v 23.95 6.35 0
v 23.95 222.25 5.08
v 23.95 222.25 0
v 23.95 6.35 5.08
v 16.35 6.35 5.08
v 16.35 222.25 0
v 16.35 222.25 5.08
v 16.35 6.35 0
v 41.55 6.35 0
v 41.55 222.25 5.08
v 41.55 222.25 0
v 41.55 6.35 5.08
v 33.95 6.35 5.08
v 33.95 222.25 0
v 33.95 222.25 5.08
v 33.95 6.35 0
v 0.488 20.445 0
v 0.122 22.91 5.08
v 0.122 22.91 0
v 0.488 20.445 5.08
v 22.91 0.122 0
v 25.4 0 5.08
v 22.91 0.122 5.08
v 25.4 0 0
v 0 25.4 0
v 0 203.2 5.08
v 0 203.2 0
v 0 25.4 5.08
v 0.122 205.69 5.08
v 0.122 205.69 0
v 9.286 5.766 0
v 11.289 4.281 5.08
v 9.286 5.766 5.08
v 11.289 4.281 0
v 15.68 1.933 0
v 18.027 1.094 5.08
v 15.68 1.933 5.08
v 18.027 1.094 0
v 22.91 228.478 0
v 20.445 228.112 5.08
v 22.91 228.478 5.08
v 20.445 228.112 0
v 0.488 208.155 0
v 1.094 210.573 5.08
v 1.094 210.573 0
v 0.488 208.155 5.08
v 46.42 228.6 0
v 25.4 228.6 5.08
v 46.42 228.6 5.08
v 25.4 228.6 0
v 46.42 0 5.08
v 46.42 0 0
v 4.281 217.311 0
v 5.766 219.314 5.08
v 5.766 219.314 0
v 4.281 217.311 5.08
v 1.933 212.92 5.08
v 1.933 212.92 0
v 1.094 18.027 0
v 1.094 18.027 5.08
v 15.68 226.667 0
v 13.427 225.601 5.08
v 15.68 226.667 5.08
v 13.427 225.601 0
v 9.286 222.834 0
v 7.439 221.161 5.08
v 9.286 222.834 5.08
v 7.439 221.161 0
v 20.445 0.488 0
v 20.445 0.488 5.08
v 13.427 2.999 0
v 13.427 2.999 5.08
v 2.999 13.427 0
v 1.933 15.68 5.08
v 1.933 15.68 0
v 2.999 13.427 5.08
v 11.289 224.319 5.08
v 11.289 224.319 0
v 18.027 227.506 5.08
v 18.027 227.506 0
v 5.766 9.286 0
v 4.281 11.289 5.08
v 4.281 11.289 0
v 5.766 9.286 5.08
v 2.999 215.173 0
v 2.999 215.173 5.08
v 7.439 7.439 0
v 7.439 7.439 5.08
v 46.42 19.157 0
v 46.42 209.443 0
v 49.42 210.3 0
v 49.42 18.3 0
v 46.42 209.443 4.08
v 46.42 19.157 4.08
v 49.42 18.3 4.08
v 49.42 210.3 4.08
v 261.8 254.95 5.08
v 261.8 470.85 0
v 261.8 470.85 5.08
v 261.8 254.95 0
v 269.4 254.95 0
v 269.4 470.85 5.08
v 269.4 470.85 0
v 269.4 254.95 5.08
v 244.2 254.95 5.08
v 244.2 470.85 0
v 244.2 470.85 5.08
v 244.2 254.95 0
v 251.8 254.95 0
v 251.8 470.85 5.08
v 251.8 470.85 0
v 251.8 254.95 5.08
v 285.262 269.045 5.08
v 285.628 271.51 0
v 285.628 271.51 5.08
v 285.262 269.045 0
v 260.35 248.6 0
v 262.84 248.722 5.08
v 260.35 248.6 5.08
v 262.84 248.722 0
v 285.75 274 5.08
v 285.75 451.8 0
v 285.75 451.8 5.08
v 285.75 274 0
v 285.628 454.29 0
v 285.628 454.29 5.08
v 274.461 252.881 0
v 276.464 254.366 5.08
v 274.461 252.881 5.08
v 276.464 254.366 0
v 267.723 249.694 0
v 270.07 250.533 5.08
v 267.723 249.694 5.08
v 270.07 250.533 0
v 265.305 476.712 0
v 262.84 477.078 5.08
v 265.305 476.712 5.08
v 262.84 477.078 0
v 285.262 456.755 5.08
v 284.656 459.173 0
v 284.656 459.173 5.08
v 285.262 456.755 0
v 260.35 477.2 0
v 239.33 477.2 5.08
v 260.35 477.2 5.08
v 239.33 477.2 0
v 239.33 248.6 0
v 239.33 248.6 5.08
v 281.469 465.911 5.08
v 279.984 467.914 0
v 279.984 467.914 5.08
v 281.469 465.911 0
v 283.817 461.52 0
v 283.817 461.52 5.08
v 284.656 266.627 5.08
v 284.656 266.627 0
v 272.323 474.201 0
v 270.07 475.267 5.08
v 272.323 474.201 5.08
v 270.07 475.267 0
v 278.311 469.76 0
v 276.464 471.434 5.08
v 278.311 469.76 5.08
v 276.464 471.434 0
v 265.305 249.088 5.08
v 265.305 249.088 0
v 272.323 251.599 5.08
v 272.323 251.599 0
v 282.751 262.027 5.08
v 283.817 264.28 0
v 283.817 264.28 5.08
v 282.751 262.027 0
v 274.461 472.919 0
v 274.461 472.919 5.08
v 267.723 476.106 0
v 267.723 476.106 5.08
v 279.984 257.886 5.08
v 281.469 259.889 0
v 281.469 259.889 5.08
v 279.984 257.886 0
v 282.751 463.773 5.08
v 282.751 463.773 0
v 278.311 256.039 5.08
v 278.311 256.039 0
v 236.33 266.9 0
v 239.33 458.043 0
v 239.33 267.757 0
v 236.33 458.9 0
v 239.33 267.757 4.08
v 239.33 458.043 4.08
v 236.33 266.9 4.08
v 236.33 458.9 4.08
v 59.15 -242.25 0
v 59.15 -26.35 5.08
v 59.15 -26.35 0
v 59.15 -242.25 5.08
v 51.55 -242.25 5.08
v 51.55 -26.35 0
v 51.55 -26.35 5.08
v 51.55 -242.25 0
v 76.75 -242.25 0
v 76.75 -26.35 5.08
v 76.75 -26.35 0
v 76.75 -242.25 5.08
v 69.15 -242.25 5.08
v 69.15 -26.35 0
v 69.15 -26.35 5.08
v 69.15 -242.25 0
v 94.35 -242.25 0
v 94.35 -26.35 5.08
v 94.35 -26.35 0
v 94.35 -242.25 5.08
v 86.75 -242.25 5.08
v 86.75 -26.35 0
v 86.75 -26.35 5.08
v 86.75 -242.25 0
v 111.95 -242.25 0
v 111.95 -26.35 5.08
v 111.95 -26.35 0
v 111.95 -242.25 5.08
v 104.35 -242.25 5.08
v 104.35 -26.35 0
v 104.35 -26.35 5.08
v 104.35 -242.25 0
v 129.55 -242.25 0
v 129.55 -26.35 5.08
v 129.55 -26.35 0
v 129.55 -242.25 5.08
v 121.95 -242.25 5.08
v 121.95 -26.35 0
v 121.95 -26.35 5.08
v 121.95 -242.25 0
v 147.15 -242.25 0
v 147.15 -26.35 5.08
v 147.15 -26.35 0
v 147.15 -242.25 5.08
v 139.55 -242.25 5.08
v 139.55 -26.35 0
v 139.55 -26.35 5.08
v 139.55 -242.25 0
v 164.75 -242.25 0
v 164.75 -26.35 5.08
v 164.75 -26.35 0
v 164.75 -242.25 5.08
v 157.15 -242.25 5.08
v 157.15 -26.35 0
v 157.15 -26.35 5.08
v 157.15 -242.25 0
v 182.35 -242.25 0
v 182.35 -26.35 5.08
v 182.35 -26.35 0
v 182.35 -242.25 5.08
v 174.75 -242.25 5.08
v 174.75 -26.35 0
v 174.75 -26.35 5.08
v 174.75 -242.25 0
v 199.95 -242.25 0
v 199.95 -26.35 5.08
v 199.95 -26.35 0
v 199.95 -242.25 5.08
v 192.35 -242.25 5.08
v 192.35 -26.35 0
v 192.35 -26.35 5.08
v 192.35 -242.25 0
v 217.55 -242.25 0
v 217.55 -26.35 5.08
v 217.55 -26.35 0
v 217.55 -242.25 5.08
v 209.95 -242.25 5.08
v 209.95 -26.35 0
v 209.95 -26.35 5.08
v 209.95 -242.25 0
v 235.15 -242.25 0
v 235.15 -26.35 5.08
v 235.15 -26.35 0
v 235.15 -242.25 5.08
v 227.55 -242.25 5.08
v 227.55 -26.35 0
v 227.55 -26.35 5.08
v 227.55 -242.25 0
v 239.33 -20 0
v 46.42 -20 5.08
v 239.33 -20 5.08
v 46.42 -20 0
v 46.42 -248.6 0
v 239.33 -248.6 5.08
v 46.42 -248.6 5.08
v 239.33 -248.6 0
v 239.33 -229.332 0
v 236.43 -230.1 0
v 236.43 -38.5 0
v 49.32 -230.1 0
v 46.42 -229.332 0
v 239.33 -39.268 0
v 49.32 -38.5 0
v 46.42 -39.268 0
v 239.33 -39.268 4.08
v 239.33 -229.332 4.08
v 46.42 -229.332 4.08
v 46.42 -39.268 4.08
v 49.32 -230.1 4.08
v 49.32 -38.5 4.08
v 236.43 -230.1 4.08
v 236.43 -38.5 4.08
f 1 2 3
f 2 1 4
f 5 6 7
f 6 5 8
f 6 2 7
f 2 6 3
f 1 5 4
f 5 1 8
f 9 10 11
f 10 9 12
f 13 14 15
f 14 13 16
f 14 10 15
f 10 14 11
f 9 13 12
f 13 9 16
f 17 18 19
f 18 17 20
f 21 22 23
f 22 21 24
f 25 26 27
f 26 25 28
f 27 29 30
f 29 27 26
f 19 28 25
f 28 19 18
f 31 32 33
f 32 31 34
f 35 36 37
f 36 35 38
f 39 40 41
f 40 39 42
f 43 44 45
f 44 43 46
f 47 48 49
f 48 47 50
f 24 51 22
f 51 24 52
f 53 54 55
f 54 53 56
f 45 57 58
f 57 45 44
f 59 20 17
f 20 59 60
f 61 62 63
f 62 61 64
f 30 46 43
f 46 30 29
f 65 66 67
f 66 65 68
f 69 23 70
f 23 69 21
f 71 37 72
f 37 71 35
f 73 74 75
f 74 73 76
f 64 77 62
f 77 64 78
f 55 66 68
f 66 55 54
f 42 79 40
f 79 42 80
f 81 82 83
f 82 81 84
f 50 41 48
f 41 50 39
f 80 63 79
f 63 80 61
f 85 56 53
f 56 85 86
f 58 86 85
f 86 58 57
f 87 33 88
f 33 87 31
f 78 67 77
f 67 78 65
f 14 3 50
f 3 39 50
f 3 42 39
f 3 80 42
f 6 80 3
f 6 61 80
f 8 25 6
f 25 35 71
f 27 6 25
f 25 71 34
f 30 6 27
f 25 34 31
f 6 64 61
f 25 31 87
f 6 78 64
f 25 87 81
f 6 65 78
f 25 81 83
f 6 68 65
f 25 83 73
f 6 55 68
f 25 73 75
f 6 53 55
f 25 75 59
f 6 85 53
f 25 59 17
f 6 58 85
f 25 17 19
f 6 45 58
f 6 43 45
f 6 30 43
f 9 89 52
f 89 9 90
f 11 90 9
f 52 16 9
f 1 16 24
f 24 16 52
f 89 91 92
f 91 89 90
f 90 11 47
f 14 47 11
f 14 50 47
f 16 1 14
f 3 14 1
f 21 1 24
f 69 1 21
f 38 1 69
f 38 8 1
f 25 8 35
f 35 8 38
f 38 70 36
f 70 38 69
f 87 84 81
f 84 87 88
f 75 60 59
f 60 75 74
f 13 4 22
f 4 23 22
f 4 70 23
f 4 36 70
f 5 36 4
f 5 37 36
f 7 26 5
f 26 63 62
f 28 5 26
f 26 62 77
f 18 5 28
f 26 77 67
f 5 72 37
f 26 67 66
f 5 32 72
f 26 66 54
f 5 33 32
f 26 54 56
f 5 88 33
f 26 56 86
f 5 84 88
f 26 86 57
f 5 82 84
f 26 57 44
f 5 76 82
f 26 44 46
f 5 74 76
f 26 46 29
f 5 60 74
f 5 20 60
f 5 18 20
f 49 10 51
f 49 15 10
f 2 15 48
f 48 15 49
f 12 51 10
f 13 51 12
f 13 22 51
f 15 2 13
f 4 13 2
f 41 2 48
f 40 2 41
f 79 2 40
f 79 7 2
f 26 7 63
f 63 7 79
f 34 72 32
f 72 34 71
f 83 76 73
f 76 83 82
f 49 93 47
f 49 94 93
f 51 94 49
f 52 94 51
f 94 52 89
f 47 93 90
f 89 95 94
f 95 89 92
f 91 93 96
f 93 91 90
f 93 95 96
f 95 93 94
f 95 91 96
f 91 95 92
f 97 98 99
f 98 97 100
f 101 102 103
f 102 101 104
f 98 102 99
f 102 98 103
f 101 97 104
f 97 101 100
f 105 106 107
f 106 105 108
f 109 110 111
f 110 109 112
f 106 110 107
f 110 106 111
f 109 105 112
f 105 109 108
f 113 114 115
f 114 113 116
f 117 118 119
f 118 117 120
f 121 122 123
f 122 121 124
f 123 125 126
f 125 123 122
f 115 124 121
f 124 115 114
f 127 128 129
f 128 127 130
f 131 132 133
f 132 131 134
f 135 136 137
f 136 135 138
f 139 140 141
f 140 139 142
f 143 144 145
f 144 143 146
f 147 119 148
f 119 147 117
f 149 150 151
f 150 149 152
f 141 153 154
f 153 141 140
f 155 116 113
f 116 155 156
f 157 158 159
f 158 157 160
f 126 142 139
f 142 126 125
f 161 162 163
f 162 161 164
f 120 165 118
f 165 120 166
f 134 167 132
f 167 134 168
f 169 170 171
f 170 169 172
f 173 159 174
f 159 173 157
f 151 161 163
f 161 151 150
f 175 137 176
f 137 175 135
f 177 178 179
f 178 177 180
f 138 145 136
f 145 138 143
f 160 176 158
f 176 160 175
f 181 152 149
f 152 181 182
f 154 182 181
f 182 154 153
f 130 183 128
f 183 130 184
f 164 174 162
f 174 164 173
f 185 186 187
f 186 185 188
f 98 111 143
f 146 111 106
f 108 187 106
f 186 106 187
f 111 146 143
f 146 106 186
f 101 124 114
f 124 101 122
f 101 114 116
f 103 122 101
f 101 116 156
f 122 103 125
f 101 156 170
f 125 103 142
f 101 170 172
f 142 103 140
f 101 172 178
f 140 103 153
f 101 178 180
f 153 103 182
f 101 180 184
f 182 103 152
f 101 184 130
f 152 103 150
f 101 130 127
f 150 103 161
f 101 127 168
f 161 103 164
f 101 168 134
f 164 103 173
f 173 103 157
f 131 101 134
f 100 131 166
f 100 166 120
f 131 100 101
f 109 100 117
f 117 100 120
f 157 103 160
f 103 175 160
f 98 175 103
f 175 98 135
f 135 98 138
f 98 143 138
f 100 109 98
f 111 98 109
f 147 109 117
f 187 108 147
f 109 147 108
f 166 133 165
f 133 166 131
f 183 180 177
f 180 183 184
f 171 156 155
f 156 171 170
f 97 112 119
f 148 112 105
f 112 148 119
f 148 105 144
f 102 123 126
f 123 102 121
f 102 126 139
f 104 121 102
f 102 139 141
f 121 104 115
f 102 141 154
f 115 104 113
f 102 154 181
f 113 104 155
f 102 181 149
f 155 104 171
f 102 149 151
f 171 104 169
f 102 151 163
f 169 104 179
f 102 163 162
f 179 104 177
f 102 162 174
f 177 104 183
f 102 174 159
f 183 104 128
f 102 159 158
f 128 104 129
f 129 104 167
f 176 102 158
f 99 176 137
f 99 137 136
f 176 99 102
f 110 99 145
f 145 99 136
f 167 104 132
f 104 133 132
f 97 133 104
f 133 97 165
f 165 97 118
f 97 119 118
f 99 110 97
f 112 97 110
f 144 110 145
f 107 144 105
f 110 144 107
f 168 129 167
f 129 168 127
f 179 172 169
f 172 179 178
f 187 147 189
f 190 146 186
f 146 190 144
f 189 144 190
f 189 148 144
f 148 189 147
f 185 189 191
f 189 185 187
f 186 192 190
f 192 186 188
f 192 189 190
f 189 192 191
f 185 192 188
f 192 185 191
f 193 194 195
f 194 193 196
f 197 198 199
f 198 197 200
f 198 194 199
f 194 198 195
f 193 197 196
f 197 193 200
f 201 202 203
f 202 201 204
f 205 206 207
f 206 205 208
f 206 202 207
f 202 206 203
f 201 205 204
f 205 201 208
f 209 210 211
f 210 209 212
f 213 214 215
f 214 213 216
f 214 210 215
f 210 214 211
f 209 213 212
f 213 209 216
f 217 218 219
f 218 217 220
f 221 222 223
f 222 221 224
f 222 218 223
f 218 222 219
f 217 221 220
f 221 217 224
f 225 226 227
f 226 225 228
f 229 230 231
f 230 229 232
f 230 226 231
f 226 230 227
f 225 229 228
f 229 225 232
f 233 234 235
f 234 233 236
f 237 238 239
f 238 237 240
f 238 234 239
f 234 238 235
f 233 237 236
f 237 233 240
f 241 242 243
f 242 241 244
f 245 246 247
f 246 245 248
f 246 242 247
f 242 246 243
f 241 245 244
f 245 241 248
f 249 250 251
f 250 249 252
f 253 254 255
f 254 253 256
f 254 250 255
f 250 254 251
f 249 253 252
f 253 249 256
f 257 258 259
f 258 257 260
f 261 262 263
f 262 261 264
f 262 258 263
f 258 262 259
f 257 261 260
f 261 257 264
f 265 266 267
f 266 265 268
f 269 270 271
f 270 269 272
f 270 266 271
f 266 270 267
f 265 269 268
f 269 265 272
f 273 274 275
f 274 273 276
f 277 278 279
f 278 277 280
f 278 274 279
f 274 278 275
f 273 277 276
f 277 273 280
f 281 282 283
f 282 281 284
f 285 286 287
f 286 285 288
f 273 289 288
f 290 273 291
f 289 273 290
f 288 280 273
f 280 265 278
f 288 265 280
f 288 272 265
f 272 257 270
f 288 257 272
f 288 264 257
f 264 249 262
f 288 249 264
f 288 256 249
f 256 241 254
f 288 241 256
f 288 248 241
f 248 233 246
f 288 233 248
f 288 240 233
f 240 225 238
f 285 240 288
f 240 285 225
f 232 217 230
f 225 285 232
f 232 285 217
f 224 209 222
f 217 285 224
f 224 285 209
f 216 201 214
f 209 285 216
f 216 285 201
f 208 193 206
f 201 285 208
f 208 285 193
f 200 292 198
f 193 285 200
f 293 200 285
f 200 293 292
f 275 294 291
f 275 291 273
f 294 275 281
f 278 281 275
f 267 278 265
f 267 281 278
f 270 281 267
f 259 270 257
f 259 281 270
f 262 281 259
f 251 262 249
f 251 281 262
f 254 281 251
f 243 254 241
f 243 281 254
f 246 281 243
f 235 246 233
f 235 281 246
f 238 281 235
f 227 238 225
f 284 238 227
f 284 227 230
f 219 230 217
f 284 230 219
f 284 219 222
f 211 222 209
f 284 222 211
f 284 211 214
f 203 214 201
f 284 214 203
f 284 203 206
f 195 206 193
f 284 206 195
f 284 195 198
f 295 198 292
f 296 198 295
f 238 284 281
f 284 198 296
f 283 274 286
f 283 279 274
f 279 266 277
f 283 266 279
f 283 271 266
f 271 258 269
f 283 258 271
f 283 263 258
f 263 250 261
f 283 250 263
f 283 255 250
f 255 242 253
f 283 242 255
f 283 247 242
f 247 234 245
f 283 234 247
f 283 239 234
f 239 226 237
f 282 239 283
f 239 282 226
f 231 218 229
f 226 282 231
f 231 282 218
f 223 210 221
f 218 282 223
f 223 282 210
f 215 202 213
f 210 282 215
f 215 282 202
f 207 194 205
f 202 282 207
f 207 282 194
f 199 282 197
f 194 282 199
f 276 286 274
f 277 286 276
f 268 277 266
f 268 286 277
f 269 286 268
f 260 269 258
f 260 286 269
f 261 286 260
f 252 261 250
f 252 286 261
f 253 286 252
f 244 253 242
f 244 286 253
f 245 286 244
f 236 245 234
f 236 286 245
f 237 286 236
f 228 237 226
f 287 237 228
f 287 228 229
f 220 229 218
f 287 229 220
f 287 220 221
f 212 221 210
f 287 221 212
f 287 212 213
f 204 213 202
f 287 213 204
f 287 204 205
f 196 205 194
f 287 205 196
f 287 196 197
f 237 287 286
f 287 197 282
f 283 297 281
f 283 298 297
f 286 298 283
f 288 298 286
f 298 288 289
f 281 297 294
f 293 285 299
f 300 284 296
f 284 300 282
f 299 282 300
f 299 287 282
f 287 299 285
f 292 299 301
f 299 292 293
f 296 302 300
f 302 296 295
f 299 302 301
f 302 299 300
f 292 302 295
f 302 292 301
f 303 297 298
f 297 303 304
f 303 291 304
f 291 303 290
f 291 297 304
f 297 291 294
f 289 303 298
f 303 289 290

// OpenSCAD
// file: model-forge/model-forge/tray.scad
// model-forge/tray.scad — rounded-corner outer panel with a recessed
// inset pocket (e.g. a "cooking dish" recess): a raised rim around the
// edge, floor thickness under the pocket, and an optional thin lip
// flange around the base — sized to slide into a support-rail groove
// (like the wooden rails inside the real Tiny Land oven cavity) rather
// than just resting loose.
//
//   use <model-forge/tray.scad>
//   rounded_tray(outer_width=285.75, outer_height=228.6, corner_radius=25.4,
//                floor_thickness=5.08, rim_height=3.81, inset_margin=6.35,
//                lip_width=3, lip_thickness=2);
//
// Shape: outer_width x outer_height slab, rounded corners (corner_radius),
// total height = floor_thickness + rim_height. A pocket is cut from the
// top, inset_margin in from every edge, cutting down through rim_height
// and stopping at floor_thickness from the bottom — so floor_thickness is
// what's left under the pocket, rim_height is how tall the surrounding
// wall stands above the pocket floor.
//
// The lip (lip_width/lip_thickness) is a thin flange at the TOP of the
// rim (from total_height-lip_thickness to total_height), sticking out
// lip_width beyond the main body on every side — corrected 2026-09-11
// per feedback on the real rail photo: the groove is near the top of the
// cavity wall, not the bottom. Both default to 0 (no lip) so existing
// calls keep working unchanged.

// hull-of-4-circles rounded rect — much faster to render than a
// minkowski-based approach for this shape (no minkowski sum needed).
module rounded_rect_2d(w, h, r) {
  hull() {
    translate([r, r]) circle(r = r, $fn = 64);
    translate([w - r, r]) circle(r = r, $fn = 64);
    translate([r, h - r]) circle(r = r, $fn = 64);
    translate([w - r, h - r]) circle(r = r, $fn = 64);
  }
}

module rounded_tray(
  outer_width,
  outer_height,
  corner_radius,
  floor_thickness,
  rim_height,
  inset_margin,
  lip_width = 0,
  lip_thickness = 0
) {
  total_height = floor_thickness + rim_height;

  union() {
    if (lip_width > 0 && lip_thickness > 0) {
      translate([-lip_width, -lip_width, total_height - lip_thickness])
        linear_extrude(height = lip_thickness)
          rounded_rect_2d(outer_width + 2 * lip_width, outer_height + 2 * lip_width, corner_radius + lip_width);
    }
    difference() {
      linear_extrude(height = total_height)
        rounded_rect_2d(outer_width, outer_height, corner_radius);
      translate([inset_margin, inset_margin, floor_thickness])
        cube([outer_width - 2 * inset_margin, outer_height - 2 * inset_margin, rim_height + 1]);
    }
  }
}
// file: model-forge/joint.scad
// model-forge/joint.scad — dovetail finger-joint tabs for snap-fit panel
// segmentation. One segment gets protruding tabs (union onto its edge),
// the matching segment gets slightly-larger slots (difference cut into
// its edge) so the two press together with a light interference/snap fit.
//
// Both modules produce a 2D profile running along the X axis, centered
// on the boundary line (y=0), for a boundary of the given edge_length.
// The caller extrudes and positions/rotates it onto the actual seam
// (see back-wall-joint-test.scad for a worked example on a vertical seam).
//
//   use <model-forge/joint.scad>
//   linear_extrude(height=thickness)
//     dovetail_tabs_2d(edge_length=60, tab_width=15, tab_depth=6, taper=2);
//   // on the MATING piece, subtract:
//   linear_extrude(height=thickness+2)
//     dovetail_tabs_2d(edge_length=60, tab_width=15, tab_depth=6, taper=2, clearance=0.15);

module dovetail_tab_2d(tab_width, tab_depth, taper, base_overlap = 0.5) {
  // Trapezoid: narrow at the base, wider at the tip (y=tab_depth) — the
  // taper is what makes it a dovetail (can't pull straight out sideways
  // once the mating slot is filled) and gives the snap/interference feel
  // as it's pressed in along Y. The base extends base_overlap PAST y=0
  // (the seam line) on purpose: a cut/union placed exactly flush with a
  // piece's boundary face (zero overlap) is a classic OpenSCAD/CGAL
  // gotcha — coincident faces produce degenerate, non-manifold results
  // (confirmed here: without the overlap this rendered as a distorted
  // sliver instead of a clean notch). The overlap guarantees real overlap
  // for both the union (tab) and difference (slot) uses.
  polygon(points = [
    [-tab_width / 2, -base_overlap],
    [tab_width / 2, -base_overlap],
    [tab_width / 2 + taper, tab_depth],
    [-tab_width / 2 - taper, tab_depth],
  ]);
}

/**
 * A row of dovetail tabs spanning edge_length, evenly spaced and centered,
 * each tab_width wide with tab_depth of protrusion and the given taper.
 * Pass clearance > 0 (e.g. 0.15-0.2mm) when using this as a SLOT cutout on
 * the mating piece, so the tab has just enough room to press in.
 */
module dovetail_tabs_2d(edge_length, tab_width, tab_depth, taper, clearance = 0) {
  // Growing the slot via offset(delta=clearance) produced a disconnected
  // sliver fragment at the corner (confirmed with --render: 3 volumes
  // instead of 2, a known OpenSCAD quirk with delta-mode offset on a
  // trapezoid). Scaling the tab's own dimensions directly instead avoids
  // offset() entirely and renders as the expected 2 volumes.
  pitch = tab_width * 2;
  n = max(1, floor(edge_length / pitch));
  row_width = n * pitch - tab_width;
  start_x = -row_width / 2;
  for (i = [0 : n - 1]) {
    translate([start_x + i * pitch, 0])
      dovetail_tab_2d(tab_width + 2 * clearance, tab_depth + clearance, taper + clearance);
  }
}
// file: model-forge/grate.scad
// model-forge/grate.scad — rounded-corner panel cut into an oven-rack-
// style bar grate: a solid frame border, parallel bars across the
// interior with open gaps between them.
//
//   use <model-forge/grate.scad>
//   oven_grate(outer_width=285.75, outer_height=228.6, corner_radius=25.4,
//              thickness=5.08, frame_width=6.35, bar_width=10, gap_width=7.6);
//
// Bars run parallel to the height (vertical bars spanning the width),
// starting and ending with a solid bar against the frame — real oven
// racks don't have a gap right at the edge. Spacing is pitch-based
// (bar_width + gap_width repeating); it won't divide the interior
// perfectly evenly on every size, so the last bar absorbs any leftover
// width. Tune bar_width/gap_width and re-render if that's visible.
use <model-forge/tray.scad> // rounded_rect_2d

module oven_grate(outer_width, outer_height, corner_radius, thickness, frame_width, bar_width, gap_width) {
  inner_width = outer_width - 2 * frame_width;
  inner_height = outer_height - 2 * frame_width;
  pitch = bar_width + gap_width;
  n_gaps = floor((inner_width - bar_width) / pitch);

  difference() {
    linear_extrude(height = thickness)
      rounded_rect_2d(outer_width, outer_height, corner_radius);
    for (i = [0 : n_gaps - 1]) {
      x = frame_width + bar_width + i * pitch;
      translate([x, frame_width, -1])
        cube([gap_width, inner_height, thickness + 2]);
    }
  }
}
// main file
// Tiny Land oven grate v3 — "oven grate separated": cut from the REAL
// grate (lib/model-forge/grate.scad's oven_grate(), unmodified), not
// rebuilt from primitives. The previous rack version reconstructed
// rails/bars/edge wings from scratch, which introduced a string of new
// bugs (a wrong fillet radius, a mirror-winding bug, a corner radius
// that ate into the tenon margin) that don't exist in the original
// geometry, which already has the right shapes and sections for the
// end caps. This version calls oven_grate() directly (the archived
// oven-grate.scad and the library module are both left untouched) and
// CUTS it into 3 pieces with dovetail joints at the seams — the same
// principle as Bambu Studio's own Cut Tool, applied here so the joint
// can be parametric and reused across the whole part family.
//
// The end-cap-to-middle seam tab runs along X (perpendicular cut,
// dovetail_tab_2d rotated -90) while the existing bar-to-rail tenons
// inside the middle piece run along Y — a 90-degree relationship
// between the two joint systems, as asked for.
//
// Bug fixed 2026-09-13, found the hard way: cut position used to be at
// 33.89mm, the boundary between bar 2 and the GAP after it -- picked to
// avoid slicing a bar. That was backwards. A gap is empty space for the
// full height except the thin 6.35mm frame bands top and bottom, so a
// dovetail spanning most of the height at that x-position was reaching
// into open air for nearly its entire length -- "dovetailing to
// nothing." Fixed by cutting through the CENTER of bar 3 instead
// (46.42mm) -- a bar runs the full inner height, so slicing through its
// width still leaves continuous material top-to-bottom on both sides
// of the cut. This is the opposite lesson from the earlier horizontal
// grate-halves cut (land in a gap there, since bars run parallel to
// that cut and landing in one bar's own gap avoids severing any bar
// entirely) -- direction relative to the bars matters.
//
// Fill orientation, confirmed twice: the two ROUNDED EDGE pieces carry
// the tab, positioned fill-on-top / tenon-from-bottom (z=0 up to
// thickness-floor_thickness, solid above that) — these pieces are
// loaded by the whole rack pulling against the oven cavity's side
// groove, not by weight from above. The MIDDLE piece gets the matching
// slot at the same z-range. This is a SEPARATE joint from the existing
// bar-into-rail system inside the middle piece (unchanged, still
// floor-at-bottom there — those bars ARE loaded from above).
//
// Middle piece checked at 217.97 x 228.6mm — fits the 256mm bed flat,
// no rotation or further cut needed.
use <model-forge/grate.scad>
use <model-forge/joint.scad>

/* [Size — inches] */
outer_width_in  = 11.25;
outer_height_in = 9;
corner_radius_in = 1;

/* [Bars] */
thickness_mm   = 5.08;
frame_width_mm = 6.35;
bar_width_mm   = 10;
gap_width_mm   = 7.6;

/* [Lip — docks into the oven cavity's support rail] */
lip_width_in     = 0.12;
end_lip_width_in = 0.5;
lip_thickness_mm = 2.5;

/* [Seam joint — ONE large dovetail spanning most of the seam height,
   not a small centered tab. We no longer need many distributed joints
   here (that was specifically for cutting through 16 repeated bars,
   which doesn't apply to this plain frame-to-frame seam) — a single
   big, tight-fitting dovetail across almost the full height is
   simpler and stronger, same principle as the Bambu sliding-dovetail.
   190mm leaves ~19mm margin on each end within the piece's 228.6mm
   height. depth+taper (4mm) must stay under bar 3's own half-width
   (5mm from the cut center to the bar's own edge) or the tab reaches
   past the bar into the next gap over — same "dovetailing to nothing"
   mistake, just smaller. */
seam_tenon_width = 190;
seam_tenon_depth = 3;
seam_tenon_taper = 1;
seam_clearance   = -0.1;   // validated winning value
floor_thickness  = 1;      // matches the bar/rail mortise floor elsewhere

IN_TO_MM = 25.4;
outer_w = outer_width_in * IN_TO_MM;
outer_h = outer_height_in * IN_TO_MM;
cut_x = 46.42; // see header comment — center of bar 3, not a gap boundary
tenon_h = thickness_mm - floor_thickness;
BIG = 1000;

module full_grate() {
  oven_grate(
    outer_width   = outer_w,
    outer_height  = outer_h,
    corner_radius = corner_radius_in * IN_TO_MM,
    thickness     = thickness_mm,
    frame_width   = frame_width_mm,
    bar_width     = bar_width_mm,
    gap_width     = gap_width_mm,
    lip_width     = lip_width_in * IN_TO_MM,
    end_lip_width = end_lip_width_in * IN_TO_MM,
    lip_thickness = lip_thickness_mm
  );
}

// The tab, on the seam plane, centered on the piece's own y-midpoint.
// z=0 to (thickness-floor_thickness): fill-on-top / tenon-from-bottom.
module seam_tab(y_center) {
  translate([cut_x, y_center, 0])
    rotate([0, 0, -90])
      linear_extrude(height = tenon_h)
        dovetail_tab_2d(seam_tenon_width, seam_tenon_depth, seam_tenon_taper);
}

module seam_slot(y_center) {
  translate([cut_x, y_center, -1])
    rotate([0, 0, -90])
      linear_extrude(height = tenon_h + 1)
        dovetail_tab_2d(
          seam_tenon_width + 2 * seam_clearance,
          seam_tenon_depth + seam_clearance,
          seam_tenon_taper + seam_clearance
        );
}

module left_edge_piece() {
  union() {
    intersection() {
      full_grate();
      translate([-BIG, -BIG, -1])
        cube([BIG + cut_x, outer_h + 2 * BIG, thickness_mm + 2]);
    }
    seam_tab(outer_h / 2);
  }
}

module right_edge_piece() {
  mirror([1, 0, 0])
    translate([-outer_w, 0, 0])
      left_edge_piece();
}

module middle_piece() {
  difference() {
    intersection() {
      full_grate();
      translate([cut_x, -BIG, -1])
        cube([outer_w - 2 * cut_x, outer_h + 2 * BIG, thickness_mm + 2]);
    }
    seam_slot(outer_h / 2);
    translate([outer_w, 0, 0])
      mirror([1, 0, 0])
        seam_slot(outer_h / 2);
  }
}

left_edge_piece();
translate([0, outer_h + 20, 0]) right_edge_piece();
translate([0, -(outer_h + 20), 0]) middle_piece();
